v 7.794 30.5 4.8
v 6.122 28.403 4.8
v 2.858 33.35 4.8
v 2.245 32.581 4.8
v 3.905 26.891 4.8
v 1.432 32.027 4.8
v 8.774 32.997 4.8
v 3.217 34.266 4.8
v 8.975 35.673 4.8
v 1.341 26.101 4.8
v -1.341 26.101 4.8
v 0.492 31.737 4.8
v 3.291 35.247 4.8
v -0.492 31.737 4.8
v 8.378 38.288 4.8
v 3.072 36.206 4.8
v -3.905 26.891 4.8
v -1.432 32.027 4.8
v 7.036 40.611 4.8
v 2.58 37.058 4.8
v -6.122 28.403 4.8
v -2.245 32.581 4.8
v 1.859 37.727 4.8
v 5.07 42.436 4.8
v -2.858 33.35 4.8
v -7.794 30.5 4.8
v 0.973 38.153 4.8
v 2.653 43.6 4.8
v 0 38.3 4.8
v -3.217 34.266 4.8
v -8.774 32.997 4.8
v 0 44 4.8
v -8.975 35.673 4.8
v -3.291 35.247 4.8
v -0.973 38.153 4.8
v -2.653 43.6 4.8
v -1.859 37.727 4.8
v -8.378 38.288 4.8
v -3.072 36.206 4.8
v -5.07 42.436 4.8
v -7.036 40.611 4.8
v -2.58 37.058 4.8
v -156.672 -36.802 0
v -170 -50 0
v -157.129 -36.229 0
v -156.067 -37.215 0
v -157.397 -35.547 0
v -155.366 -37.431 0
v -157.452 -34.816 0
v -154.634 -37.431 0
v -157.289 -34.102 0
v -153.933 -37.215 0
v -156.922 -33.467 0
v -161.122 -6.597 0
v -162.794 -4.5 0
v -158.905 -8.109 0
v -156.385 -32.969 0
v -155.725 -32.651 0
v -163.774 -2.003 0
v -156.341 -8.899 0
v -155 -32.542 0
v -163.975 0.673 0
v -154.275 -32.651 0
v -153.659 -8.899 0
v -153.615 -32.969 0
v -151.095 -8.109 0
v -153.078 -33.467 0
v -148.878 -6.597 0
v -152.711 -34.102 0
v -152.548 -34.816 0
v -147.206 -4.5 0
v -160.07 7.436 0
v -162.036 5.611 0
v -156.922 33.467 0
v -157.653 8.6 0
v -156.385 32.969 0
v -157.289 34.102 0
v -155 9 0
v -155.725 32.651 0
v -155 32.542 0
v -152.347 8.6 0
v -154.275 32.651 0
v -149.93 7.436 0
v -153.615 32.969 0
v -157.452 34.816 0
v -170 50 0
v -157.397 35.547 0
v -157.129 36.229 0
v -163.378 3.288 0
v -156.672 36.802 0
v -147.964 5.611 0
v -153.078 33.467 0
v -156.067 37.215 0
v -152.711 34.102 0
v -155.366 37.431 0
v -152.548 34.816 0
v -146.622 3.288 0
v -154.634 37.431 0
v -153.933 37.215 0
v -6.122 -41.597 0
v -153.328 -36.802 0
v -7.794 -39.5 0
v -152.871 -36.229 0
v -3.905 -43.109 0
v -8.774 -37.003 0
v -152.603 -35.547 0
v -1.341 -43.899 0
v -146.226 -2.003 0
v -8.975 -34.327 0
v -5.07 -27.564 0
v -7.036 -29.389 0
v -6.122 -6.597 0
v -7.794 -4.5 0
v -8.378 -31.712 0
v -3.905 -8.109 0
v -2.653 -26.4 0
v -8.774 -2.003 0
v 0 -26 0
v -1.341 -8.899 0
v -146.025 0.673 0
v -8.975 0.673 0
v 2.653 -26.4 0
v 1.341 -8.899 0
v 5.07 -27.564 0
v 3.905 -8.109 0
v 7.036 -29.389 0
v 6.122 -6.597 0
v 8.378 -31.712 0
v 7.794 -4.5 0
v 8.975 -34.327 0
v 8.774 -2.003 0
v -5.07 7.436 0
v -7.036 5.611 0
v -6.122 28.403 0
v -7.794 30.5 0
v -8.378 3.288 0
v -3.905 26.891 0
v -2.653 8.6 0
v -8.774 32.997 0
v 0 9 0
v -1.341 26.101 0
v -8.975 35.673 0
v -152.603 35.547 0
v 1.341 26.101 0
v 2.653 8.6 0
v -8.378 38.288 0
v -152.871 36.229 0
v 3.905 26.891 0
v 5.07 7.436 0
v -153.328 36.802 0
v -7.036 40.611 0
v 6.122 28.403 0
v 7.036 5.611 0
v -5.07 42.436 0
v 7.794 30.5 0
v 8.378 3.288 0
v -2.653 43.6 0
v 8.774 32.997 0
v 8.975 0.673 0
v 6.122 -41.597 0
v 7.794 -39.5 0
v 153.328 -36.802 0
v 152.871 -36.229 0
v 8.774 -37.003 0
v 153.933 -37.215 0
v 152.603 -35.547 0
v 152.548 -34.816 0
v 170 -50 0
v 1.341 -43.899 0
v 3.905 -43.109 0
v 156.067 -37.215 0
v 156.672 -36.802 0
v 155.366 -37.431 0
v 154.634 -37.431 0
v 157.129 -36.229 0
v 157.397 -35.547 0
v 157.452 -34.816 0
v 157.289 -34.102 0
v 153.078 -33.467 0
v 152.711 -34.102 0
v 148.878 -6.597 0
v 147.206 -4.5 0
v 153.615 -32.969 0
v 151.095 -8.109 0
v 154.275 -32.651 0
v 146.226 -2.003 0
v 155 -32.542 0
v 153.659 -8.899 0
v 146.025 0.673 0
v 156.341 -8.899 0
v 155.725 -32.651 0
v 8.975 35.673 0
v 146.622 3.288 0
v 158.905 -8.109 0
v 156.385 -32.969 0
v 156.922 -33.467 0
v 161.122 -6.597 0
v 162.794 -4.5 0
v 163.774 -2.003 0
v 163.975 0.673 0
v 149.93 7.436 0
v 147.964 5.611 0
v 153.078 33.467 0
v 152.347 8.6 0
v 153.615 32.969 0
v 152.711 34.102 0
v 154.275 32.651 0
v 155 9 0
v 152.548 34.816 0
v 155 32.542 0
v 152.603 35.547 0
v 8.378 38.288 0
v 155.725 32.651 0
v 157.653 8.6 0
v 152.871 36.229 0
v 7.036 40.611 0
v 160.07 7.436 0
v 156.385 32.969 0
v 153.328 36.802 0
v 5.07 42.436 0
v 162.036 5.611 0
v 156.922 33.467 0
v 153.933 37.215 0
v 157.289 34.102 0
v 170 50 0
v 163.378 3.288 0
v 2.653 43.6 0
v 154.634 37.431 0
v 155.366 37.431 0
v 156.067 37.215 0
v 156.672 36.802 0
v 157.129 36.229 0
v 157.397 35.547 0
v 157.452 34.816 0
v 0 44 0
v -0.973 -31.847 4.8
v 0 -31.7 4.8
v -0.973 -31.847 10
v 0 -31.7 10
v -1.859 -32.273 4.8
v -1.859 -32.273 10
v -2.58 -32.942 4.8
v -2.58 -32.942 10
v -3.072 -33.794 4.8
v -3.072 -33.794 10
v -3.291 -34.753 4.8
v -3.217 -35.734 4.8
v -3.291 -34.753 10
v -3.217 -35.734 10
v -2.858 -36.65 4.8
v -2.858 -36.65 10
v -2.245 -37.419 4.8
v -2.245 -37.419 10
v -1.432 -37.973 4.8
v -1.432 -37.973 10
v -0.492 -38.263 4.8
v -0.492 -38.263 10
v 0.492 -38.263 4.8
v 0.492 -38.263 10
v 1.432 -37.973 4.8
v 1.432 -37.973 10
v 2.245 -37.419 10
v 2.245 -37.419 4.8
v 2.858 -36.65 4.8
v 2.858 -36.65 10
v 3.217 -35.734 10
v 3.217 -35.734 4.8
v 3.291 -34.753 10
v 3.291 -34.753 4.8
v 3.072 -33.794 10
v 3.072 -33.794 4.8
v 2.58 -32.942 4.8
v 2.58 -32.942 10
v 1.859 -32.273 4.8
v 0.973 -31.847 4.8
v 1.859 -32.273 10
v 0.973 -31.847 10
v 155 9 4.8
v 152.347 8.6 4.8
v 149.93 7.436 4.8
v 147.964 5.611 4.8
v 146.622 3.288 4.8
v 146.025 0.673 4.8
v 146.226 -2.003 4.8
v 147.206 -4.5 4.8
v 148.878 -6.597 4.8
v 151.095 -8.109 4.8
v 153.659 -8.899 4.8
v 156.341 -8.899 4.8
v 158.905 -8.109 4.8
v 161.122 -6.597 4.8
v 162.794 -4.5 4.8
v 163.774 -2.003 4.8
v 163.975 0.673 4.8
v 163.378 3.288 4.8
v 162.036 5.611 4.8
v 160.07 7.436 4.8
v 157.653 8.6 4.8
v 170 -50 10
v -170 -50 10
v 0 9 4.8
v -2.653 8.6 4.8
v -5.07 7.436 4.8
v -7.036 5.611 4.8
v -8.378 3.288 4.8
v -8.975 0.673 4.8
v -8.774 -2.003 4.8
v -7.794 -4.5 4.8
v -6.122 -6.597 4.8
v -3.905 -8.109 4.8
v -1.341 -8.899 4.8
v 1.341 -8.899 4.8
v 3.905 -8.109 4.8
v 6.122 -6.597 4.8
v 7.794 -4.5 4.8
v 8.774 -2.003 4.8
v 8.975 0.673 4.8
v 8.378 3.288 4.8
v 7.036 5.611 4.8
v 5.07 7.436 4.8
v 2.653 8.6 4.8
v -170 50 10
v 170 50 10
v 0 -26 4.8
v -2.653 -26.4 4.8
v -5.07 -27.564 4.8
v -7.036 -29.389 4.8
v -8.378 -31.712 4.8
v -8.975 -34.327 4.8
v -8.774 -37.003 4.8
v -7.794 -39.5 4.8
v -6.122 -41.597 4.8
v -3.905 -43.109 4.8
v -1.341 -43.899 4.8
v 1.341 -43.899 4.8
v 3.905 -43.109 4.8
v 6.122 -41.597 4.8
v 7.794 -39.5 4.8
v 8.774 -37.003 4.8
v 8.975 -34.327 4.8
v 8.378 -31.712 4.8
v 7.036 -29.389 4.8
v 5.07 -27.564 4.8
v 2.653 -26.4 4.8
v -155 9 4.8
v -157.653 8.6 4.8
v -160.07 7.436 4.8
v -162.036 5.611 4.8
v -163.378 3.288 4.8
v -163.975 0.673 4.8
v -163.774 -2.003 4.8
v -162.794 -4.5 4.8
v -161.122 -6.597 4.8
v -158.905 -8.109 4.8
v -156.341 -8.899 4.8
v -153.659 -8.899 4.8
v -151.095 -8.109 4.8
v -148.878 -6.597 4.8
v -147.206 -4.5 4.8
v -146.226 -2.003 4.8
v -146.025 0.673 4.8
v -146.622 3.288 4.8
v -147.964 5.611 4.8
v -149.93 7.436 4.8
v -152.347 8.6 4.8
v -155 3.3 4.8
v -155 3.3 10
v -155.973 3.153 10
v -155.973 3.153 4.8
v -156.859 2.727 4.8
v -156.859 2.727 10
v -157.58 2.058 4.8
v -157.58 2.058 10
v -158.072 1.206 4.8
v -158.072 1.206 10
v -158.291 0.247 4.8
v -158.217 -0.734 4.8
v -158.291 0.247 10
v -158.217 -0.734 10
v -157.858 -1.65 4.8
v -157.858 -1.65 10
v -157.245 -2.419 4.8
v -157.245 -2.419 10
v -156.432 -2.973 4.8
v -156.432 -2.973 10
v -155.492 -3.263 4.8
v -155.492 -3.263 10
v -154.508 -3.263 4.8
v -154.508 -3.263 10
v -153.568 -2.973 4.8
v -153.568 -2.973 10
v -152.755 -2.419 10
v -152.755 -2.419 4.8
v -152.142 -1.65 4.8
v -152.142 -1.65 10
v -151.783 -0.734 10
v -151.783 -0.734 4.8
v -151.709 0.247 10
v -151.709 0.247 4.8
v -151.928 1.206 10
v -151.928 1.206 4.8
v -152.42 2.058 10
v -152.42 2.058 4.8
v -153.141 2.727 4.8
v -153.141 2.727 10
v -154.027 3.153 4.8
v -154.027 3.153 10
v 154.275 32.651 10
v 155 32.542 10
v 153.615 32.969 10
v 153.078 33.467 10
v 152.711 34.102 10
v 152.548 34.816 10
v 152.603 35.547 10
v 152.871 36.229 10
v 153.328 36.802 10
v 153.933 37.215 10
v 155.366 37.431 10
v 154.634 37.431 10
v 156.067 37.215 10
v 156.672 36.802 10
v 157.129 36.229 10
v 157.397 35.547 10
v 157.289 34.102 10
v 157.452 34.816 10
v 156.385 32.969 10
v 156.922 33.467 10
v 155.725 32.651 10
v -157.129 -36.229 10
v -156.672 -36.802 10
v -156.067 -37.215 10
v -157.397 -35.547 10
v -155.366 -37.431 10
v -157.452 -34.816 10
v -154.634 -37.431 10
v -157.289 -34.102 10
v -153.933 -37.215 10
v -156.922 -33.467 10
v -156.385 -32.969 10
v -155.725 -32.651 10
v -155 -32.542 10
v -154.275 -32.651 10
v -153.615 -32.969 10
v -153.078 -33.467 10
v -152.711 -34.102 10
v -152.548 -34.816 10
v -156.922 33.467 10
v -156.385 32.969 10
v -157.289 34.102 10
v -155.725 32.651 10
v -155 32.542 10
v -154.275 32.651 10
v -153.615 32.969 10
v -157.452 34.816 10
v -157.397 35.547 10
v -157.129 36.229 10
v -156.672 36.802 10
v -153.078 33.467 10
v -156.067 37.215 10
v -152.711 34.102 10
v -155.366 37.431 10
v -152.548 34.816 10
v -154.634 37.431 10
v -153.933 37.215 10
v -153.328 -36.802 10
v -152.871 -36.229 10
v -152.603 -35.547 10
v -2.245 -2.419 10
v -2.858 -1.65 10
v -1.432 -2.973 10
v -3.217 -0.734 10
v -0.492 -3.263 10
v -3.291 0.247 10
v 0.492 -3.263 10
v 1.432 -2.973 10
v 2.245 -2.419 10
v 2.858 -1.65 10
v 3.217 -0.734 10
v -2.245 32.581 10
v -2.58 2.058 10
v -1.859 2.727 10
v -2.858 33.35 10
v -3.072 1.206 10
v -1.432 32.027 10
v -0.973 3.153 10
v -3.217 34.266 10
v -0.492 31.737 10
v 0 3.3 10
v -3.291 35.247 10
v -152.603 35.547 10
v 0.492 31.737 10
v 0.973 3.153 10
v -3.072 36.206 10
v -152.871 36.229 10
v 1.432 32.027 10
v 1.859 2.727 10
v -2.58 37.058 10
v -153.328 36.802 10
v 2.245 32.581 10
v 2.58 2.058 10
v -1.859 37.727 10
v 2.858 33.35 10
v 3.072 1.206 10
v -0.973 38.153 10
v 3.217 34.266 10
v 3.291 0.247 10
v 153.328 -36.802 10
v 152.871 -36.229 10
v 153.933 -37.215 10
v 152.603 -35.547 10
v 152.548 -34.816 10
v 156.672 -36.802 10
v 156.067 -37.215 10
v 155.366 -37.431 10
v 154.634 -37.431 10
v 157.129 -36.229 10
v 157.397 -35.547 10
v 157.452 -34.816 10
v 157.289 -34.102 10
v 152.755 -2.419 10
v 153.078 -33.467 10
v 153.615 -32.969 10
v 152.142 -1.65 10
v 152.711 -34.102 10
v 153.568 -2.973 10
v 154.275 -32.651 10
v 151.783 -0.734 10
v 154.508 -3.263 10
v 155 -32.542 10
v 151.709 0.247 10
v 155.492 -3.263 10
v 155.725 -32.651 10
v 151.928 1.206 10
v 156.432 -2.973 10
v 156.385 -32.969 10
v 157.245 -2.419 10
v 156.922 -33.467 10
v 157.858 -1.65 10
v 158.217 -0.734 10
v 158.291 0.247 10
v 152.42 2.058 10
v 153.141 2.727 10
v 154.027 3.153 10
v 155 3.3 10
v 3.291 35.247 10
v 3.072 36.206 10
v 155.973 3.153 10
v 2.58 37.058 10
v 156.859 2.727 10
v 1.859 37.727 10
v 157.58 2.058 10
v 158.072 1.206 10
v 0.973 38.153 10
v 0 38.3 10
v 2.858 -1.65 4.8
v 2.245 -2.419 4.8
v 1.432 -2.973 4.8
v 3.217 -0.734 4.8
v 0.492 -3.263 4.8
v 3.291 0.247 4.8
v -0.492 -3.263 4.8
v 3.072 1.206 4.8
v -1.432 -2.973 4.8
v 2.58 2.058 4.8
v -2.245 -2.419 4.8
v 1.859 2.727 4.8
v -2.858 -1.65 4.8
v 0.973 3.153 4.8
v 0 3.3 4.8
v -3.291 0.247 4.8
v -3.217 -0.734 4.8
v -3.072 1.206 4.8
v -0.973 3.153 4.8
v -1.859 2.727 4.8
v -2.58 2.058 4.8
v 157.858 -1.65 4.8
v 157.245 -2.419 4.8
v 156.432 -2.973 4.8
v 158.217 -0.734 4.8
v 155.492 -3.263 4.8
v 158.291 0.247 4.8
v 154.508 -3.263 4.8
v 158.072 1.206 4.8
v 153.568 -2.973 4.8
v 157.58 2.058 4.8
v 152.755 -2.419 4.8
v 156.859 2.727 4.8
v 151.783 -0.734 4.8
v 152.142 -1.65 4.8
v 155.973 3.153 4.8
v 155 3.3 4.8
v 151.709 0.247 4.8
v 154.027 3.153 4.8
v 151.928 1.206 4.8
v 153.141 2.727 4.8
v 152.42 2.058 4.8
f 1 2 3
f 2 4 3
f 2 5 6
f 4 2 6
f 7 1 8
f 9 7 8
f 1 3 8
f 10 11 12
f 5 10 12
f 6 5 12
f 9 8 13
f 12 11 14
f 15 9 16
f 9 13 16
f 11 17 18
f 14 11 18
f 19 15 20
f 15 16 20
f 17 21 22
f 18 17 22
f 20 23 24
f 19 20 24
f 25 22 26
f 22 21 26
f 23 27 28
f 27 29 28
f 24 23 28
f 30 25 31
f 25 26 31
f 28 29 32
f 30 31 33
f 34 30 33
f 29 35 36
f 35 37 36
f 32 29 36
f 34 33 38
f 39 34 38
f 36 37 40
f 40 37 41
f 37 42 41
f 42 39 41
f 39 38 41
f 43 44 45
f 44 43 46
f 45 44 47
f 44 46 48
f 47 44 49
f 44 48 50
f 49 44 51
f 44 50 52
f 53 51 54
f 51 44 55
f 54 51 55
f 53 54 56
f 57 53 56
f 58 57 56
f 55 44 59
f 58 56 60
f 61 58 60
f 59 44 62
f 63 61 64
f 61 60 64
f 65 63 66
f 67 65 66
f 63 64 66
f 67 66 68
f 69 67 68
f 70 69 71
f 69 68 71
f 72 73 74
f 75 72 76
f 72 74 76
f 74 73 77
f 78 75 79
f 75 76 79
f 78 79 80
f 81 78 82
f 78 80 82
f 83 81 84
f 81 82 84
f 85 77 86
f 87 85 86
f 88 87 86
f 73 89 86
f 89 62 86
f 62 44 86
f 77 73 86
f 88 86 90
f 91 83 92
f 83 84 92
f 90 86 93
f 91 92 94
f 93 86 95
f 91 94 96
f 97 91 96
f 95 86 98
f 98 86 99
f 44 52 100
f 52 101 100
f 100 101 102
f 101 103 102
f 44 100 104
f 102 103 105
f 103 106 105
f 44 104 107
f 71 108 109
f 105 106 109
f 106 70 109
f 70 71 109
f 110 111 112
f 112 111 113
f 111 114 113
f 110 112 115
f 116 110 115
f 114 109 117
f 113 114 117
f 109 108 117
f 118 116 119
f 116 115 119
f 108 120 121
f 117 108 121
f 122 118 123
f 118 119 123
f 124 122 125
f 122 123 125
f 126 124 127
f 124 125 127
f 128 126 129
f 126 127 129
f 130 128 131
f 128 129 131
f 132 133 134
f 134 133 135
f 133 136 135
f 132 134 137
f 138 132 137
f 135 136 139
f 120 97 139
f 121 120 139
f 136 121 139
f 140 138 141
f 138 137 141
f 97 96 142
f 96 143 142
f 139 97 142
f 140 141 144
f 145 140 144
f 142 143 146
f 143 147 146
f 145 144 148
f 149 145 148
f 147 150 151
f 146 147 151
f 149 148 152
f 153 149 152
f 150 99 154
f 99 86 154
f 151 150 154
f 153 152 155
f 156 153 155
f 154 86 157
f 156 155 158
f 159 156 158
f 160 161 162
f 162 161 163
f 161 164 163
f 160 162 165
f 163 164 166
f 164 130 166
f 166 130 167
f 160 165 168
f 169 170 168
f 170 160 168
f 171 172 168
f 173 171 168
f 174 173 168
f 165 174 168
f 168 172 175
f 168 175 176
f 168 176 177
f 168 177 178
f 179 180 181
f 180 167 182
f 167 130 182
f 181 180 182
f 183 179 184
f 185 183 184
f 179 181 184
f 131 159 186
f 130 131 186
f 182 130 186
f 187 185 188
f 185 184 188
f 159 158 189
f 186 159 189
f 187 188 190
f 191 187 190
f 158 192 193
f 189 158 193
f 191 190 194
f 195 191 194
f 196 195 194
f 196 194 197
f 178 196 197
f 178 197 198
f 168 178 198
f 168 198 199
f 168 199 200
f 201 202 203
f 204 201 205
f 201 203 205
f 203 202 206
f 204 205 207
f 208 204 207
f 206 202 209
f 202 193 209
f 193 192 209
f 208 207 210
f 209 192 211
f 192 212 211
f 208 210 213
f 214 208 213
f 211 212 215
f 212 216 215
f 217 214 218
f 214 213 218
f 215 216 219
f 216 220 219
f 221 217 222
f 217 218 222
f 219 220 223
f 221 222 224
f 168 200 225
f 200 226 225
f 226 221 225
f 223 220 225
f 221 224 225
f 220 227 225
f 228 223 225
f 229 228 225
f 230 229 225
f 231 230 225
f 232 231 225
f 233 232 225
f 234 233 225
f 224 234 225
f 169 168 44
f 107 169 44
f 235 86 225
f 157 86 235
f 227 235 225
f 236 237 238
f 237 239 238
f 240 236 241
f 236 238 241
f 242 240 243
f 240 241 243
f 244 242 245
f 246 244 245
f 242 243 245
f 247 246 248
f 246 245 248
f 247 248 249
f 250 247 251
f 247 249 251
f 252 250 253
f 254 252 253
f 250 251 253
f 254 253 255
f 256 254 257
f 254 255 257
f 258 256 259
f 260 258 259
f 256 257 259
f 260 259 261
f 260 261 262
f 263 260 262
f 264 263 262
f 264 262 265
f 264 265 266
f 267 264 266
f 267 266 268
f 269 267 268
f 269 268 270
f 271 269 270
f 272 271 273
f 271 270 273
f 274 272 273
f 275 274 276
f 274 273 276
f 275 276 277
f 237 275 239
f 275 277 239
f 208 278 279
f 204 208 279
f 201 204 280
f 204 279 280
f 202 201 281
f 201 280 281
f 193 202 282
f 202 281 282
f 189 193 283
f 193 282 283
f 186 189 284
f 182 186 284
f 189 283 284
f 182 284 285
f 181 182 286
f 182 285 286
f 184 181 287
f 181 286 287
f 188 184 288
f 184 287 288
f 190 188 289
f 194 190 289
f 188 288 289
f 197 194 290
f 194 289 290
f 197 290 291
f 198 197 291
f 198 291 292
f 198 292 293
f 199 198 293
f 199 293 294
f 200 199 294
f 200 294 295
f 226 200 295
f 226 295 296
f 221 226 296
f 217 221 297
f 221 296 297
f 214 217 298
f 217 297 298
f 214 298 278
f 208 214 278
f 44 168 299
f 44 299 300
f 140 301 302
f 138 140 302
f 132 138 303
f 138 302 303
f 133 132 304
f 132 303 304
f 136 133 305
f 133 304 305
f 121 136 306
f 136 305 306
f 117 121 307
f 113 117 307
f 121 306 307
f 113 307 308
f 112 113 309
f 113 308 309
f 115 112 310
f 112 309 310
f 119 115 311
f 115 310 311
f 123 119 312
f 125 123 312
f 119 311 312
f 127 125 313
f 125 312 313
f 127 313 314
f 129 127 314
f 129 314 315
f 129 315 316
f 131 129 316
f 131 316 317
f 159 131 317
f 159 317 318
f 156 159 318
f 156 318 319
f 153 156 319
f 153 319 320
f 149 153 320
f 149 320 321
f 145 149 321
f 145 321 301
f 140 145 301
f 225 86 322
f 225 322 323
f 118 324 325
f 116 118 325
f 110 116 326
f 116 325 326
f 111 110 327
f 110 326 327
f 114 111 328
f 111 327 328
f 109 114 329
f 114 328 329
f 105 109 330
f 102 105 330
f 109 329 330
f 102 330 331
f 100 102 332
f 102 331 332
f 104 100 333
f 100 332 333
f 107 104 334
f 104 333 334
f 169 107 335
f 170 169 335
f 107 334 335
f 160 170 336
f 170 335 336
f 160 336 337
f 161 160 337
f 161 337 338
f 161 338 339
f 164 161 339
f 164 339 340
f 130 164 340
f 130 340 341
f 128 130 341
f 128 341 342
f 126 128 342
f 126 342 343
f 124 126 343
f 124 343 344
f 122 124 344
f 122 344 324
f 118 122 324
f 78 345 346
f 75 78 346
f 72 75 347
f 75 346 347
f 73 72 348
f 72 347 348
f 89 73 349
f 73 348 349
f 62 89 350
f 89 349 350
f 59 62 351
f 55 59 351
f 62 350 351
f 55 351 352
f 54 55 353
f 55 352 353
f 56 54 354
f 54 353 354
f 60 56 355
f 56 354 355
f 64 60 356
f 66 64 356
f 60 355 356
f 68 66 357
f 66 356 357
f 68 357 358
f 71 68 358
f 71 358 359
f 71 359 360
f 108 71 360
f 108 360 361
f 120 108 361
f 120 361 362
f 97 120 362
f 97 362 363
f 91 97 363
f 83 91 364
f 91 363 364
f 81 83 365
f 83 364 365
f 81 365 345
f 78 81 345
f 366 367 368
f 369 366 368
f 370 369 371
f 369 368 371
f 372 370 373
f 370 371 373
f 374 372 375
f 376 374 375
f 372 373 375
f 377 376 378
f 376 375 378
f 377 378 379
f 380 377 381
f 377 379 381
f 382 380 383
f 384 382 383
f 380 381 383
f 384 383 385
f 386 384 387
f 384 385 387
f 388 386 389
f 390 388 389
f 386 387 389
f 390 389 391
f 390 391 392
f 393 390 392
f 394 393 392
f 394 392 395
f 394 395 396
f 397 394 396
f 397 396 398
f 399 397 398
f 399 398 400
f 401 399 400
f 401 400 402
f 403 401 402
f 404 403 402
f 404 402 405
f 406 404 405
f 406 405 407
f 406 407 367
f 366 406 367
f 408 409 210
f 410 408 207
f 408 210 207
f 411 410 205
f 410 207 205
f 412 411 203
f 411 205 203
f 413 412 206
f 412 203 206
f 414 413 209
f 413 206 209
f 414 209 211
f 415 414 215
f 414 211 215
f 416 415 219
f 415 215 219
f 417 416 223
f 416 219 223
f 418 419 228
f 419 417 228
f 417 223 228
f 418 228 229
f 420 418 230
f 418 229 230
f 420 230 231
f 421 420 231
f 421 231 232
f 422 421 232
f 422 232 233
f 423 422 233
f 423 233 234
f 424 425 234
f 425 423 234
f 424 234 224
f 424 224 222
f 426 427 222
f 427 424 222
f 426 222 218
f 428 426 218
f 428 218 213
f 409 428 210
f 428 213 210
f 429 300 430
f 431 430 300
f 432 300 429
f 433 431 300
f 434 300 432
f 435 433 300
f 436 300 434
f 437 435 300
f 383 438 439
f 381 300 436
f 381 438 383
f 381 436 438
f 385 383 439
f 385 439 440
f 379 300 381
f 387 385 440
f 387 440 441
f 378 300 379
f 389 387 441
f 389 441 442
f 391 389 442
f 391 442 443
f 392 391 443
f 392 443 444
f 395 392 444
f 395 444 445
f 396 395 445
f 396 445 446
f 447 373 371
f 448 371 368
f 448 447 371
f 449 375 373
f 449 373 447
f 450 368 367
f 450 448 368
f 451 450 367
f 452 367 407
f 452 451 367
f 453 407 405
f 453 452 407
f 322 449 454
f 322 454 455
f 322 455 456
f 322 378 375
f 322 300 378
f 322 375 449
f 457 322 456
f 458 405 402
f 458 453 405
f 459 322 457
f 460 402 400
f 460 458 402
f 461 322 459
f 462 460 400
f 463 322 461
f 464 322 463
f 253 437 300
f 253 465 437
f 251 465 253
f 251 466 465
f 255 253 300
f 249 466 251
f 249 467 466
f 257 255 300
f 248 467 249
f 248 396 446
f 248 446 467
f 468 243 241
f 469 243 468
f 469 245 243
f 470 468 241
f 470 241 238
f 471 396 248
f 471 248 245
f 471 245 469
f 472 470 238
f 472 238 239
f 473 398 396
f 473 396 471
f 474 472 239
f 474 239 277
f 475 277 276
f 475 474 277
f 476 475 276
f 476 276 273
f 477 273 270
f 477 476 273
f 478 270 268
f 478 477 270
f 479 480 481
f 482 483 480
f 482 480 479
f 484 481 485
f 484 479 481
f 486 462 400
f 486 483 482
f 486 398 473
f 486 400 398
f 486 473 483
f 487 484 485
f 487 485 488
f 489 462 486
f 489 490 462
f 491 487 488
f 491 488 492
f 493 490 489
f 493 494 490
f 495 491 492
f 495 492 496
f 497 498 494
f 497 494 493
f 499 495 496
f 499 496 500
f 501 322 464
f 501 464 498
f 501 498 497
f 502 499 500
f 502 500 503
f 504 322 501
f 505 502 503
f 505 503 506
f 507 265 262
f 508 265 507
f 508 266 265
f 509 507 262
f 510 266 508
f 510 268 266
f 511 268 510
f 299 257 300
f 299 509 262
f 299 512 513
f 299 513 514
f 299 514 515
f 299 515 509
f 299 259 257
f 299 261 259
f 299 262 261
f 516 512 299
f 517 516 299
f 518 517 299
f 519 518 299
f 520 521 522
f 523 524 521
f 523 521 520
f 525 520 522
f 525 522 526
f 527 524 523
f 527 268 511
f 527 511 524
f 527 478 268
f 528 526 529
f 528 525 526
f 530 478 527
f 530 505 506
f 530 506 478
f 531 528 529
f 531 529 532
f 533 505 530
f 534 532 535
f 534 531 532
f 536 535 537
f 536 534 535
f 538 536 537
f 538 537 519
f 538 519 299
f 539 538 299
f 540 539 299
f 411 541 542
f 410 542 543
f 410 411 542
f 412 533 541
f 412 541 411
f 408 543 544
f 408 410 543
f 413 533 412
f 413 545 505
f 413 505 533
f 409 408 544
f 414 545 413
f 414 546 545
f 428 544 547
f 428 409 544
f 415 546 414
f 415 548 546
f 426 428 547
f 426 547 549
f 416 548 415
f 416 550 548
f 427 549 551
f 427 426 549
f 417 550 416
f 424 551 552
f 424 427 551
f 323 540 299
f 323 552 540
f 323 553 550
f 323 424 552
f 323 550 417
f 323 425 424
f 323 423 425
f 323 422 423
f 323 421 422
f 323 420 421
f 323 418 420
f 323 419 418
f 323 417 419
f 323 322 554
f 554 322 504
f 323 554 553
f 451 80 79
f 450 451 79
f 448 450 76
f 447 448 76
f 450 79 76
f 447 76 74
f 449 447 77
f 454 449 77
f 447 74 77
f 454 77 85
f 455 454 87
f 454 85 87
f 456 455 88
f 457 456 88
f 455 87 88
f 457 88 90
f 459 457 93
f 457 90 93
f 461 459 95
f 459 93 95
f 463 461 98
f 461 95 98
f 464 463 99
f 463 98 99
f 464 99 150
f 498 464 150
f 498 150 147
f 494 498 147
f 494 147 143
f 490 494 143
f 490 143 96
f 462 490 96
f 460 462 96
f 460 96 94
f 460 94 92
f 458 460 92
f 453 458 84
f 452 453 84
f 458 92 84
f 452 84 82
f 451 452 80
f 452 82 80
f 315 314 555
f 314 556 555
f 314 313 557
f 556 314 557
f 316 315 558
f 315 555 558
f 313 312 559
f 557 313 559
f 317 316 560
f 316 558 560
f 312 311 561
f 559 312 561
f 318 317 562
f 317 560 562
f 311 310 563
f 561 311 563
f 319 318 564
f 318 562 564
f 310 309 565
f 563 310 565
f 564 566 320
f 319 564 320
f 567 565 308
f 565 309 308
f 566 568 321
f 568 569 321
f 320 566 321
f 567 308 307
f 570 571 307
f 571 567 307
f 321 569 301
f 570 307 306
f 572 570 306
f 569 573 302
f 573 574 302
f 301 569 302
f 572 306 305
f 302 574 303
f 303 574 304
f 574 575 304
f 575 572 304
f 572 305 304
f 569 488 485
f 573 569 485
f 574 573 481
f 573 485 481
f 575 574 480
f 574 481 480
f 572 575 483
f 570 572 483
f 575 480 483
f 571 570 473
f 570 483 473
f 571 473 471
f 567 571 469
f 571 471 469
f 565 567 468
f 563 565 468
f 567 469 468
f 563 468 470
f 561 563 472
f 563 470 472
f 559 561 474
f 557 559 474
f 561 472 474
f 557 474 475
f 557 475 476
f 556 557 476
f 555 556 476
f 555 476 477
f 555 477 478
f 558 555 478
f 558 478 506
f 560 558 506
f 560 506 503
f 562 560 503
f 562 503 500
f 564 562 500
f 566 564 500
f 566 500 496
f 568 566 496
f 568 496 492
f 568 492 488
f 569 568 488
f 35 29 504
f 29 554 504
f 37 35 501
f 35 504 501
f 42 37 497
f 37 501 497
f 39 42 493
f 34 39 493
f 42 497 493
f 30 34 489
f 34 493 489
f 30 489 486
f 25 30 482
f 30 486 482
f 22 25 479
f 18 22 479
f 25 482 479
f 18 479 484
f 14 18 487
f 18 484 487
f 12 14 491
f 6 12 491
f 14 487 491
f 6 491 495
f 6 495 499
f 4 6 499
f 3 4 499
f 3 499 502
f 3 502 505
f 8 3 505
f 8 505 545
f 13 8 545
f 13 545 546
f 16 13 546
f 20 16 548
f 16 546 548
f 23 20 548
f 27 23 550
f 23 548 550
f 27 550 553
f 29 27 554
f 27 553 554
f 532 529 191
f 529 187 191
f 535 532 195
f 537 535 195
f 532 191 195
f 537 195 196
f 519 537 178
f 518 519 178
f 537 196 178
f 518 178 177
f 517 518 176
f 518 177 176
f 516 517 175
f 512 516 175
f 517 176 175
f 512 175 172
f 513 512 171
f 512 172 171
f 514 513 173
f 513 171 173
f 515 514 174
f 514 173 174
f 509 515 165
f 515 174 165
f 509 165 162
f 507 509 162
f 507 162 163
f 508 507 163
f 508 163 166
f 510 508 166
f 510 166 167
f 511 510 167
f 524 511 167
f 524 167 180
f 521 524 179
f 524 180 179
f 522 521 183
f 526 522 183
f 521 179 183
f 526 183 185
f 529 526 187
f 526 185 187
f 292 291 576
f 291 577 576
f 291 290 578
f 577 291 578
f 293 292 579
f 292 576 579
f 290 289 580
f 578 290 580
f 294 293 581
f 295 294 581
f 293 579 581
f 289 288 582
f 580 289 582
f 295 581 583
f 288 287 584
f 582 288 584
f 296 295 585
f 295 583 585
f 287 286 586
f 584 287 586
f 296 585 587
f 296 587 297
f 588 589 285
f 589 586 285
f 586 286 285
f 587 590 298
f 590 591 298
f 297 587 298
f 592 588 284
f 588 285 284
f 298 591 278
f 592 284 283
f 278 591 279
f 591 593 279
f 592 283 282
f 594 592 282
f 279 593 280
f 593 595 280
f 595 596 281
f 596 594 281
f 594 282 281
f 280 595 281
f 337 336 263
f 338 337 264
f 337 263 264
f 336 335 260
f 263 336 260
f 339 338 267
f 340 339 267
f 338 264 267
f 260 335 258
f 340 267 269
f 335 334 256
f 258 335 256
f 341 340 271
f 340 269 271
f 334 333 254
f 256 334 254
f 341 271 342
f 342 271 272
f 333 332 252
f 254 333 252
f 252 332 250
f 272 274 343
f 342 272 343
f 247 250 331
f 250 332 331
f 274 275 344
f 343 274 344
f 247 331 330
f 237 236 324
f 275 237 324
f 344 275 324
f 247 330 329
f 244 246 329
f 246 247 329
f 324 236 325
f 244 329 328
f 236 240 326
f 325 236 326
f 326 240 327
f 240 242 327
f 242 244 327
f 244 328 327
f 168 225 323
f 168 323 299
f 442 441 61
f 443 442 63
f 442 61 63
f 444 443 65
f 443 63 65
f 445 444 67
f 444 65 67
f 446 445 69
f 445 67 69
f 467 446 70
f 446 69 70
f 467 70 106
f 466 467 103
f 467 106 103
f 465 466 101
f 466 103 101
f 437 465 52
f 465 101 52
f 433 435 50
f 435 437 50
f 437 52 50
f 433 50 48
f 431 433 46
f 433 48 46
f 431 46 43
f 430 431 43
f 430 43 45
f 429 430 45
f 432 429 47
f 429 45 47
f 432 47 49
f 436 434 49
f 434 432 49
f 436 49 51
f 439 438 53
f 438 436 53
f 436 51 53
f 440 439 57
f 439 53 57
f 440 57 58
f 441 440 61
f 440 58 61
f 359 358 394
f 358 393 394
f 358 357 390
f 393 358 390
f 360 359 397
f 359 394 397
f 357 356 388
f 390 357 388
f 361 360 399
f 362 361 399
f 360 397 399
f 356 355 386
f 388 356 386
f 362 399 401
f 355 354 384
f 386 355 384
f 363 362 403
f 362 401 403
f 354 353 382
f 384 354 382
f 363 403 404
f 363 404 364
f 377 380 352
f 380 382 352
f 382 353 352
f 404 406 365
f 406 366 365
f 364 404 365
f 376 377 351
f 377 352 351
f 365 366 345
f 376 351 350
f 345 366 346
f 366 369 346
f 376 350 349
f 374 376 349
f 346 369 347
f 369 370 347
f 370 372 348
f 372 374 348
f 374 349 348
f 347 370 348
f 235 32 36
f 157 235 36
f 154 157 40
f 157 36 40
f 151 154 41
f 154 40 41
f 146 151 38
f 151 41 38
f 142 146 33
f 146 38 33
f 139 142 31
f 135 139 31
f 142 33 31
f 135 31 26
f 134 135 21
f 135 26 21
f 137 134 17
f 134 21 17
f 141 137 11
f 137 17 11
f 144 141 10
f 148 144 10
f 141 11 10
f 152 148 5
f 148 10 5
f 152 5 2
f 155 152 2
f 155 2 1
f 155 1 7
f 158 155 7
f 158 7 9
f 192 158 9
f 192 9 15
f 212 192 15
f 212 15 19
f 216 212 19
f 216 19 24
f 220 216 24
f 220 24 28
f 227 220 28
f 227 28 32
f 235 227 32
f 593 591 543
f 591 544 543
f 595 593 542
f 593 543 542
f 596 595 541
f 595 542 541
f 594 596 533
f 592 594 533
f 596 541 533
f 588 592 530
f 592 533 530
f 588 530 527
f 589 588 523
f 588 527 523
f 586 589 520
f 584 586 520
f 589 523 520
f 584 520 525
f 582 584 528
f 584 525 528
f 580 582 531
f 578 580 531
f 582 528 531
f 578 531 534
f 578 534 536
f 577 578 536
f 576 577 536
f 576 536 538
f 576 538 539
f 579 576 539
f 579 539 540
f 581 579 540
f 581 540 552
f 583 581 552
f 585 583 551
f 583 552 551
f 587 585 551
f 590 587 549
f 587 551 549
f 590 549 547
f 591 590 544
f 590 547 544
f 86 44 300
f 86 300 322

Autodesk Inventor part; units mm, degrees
ref_plane "YZ Plane" through (0, 0, 0) normal (1, 0, 0) x (0, 1, 0)
ref_plane "XZ Plane" through (0, 0, 0) normal (0, 1, 0) x (-1, 0, 0)
ref_plane "XY Plane" through (0, 0, 0) normal (0, 0, 1) x (1, 0, 0)
sketch "Sketch1" plane through (0, 0, 0) normal (0, 0, 1) x (1, 0, 0)
  line L0 (-170, 50) -> (170, 50)
  line L1 (170, 50) -> (170, -50)
  line L2 (170, -50) -> (-170, -50)
  line L3 (-170, -50) -> (-170, 50)
  point P0 (0, 0)
  dimension "d0" = 340
  dimension "d1" = 170
  dimension "d2" = 100
  dimension "d3" = 50
extrude "baseExtrusion" add sketch "Sketch1" along normal blind 10
sketch "Sketch2" plane through (0, 0, 10) normal (0, 0, 1) x (1, 0, 0)
  line L0 (170, 50) -> (-170, 50) projected
  line L1 (-170, 50) -> (-170, -50) projected
  point P0 (0, 0)
  point P1 (-155, 35)
  dimension "d6" = 15
  dimension "d7" = 15
hole "xyStiltpt1m6MountingHoles" at (-155, 35, 10) direction (0, 0, -1) diameter 4.917 end through all thread size "M6x1" class "6H" standard "ISO Metric profile"
mirror "Mirror2" about plane through (0, 0, 0) normal (1, 0, 0) of "xyStiltpt1m6MountingHoles"
mirror "Mirror3" about plane through (0, 0, 0) normal (0, 1, 0) of "xyStiltpt1m6MountingHoles", "Mirror2"
sketch "Sketch4" plane through (0, 0, 0) normal (0, 0, -1) x (-1, 0, 0)
  line L0 (170, -50) -> (170, 50) projected
  line L1 (170, 50) -> (-170, 50) projected
  line L2 (-170, 50) -> (-170, -50) projected
  line L3 (-170, -50) -> (170, -50) projected
  point P0 (0, 0)
  point P1 (155, 0)
  point P2 (0, 0)
  point P3 (0, 35)
  point P4 (0, -35)
  point P5 (-155, 0)
  dimension "d24" = 15
  dimension "d25" = 15
  dimension "d26" = 15
  dimension "d27" = 15
hole "Hole3" at (-155, 0, 0) at (0, 0, 0) at (0, 35, 0) at (0, -35, 0) at (155, 0, 0) direction (0, 0, 1) diameter 6.6 end through all counterbore diameter 18 counterbore depth 4.8 clearance for "Hex Head Cap Screw ISO 24017" size "M6" standard "ISO"
equation "\"d1\" = 0.5 * d0"
equation "\"d3\" = 0.5 * d2"
properties part number "xyStageStilt_pt2"
